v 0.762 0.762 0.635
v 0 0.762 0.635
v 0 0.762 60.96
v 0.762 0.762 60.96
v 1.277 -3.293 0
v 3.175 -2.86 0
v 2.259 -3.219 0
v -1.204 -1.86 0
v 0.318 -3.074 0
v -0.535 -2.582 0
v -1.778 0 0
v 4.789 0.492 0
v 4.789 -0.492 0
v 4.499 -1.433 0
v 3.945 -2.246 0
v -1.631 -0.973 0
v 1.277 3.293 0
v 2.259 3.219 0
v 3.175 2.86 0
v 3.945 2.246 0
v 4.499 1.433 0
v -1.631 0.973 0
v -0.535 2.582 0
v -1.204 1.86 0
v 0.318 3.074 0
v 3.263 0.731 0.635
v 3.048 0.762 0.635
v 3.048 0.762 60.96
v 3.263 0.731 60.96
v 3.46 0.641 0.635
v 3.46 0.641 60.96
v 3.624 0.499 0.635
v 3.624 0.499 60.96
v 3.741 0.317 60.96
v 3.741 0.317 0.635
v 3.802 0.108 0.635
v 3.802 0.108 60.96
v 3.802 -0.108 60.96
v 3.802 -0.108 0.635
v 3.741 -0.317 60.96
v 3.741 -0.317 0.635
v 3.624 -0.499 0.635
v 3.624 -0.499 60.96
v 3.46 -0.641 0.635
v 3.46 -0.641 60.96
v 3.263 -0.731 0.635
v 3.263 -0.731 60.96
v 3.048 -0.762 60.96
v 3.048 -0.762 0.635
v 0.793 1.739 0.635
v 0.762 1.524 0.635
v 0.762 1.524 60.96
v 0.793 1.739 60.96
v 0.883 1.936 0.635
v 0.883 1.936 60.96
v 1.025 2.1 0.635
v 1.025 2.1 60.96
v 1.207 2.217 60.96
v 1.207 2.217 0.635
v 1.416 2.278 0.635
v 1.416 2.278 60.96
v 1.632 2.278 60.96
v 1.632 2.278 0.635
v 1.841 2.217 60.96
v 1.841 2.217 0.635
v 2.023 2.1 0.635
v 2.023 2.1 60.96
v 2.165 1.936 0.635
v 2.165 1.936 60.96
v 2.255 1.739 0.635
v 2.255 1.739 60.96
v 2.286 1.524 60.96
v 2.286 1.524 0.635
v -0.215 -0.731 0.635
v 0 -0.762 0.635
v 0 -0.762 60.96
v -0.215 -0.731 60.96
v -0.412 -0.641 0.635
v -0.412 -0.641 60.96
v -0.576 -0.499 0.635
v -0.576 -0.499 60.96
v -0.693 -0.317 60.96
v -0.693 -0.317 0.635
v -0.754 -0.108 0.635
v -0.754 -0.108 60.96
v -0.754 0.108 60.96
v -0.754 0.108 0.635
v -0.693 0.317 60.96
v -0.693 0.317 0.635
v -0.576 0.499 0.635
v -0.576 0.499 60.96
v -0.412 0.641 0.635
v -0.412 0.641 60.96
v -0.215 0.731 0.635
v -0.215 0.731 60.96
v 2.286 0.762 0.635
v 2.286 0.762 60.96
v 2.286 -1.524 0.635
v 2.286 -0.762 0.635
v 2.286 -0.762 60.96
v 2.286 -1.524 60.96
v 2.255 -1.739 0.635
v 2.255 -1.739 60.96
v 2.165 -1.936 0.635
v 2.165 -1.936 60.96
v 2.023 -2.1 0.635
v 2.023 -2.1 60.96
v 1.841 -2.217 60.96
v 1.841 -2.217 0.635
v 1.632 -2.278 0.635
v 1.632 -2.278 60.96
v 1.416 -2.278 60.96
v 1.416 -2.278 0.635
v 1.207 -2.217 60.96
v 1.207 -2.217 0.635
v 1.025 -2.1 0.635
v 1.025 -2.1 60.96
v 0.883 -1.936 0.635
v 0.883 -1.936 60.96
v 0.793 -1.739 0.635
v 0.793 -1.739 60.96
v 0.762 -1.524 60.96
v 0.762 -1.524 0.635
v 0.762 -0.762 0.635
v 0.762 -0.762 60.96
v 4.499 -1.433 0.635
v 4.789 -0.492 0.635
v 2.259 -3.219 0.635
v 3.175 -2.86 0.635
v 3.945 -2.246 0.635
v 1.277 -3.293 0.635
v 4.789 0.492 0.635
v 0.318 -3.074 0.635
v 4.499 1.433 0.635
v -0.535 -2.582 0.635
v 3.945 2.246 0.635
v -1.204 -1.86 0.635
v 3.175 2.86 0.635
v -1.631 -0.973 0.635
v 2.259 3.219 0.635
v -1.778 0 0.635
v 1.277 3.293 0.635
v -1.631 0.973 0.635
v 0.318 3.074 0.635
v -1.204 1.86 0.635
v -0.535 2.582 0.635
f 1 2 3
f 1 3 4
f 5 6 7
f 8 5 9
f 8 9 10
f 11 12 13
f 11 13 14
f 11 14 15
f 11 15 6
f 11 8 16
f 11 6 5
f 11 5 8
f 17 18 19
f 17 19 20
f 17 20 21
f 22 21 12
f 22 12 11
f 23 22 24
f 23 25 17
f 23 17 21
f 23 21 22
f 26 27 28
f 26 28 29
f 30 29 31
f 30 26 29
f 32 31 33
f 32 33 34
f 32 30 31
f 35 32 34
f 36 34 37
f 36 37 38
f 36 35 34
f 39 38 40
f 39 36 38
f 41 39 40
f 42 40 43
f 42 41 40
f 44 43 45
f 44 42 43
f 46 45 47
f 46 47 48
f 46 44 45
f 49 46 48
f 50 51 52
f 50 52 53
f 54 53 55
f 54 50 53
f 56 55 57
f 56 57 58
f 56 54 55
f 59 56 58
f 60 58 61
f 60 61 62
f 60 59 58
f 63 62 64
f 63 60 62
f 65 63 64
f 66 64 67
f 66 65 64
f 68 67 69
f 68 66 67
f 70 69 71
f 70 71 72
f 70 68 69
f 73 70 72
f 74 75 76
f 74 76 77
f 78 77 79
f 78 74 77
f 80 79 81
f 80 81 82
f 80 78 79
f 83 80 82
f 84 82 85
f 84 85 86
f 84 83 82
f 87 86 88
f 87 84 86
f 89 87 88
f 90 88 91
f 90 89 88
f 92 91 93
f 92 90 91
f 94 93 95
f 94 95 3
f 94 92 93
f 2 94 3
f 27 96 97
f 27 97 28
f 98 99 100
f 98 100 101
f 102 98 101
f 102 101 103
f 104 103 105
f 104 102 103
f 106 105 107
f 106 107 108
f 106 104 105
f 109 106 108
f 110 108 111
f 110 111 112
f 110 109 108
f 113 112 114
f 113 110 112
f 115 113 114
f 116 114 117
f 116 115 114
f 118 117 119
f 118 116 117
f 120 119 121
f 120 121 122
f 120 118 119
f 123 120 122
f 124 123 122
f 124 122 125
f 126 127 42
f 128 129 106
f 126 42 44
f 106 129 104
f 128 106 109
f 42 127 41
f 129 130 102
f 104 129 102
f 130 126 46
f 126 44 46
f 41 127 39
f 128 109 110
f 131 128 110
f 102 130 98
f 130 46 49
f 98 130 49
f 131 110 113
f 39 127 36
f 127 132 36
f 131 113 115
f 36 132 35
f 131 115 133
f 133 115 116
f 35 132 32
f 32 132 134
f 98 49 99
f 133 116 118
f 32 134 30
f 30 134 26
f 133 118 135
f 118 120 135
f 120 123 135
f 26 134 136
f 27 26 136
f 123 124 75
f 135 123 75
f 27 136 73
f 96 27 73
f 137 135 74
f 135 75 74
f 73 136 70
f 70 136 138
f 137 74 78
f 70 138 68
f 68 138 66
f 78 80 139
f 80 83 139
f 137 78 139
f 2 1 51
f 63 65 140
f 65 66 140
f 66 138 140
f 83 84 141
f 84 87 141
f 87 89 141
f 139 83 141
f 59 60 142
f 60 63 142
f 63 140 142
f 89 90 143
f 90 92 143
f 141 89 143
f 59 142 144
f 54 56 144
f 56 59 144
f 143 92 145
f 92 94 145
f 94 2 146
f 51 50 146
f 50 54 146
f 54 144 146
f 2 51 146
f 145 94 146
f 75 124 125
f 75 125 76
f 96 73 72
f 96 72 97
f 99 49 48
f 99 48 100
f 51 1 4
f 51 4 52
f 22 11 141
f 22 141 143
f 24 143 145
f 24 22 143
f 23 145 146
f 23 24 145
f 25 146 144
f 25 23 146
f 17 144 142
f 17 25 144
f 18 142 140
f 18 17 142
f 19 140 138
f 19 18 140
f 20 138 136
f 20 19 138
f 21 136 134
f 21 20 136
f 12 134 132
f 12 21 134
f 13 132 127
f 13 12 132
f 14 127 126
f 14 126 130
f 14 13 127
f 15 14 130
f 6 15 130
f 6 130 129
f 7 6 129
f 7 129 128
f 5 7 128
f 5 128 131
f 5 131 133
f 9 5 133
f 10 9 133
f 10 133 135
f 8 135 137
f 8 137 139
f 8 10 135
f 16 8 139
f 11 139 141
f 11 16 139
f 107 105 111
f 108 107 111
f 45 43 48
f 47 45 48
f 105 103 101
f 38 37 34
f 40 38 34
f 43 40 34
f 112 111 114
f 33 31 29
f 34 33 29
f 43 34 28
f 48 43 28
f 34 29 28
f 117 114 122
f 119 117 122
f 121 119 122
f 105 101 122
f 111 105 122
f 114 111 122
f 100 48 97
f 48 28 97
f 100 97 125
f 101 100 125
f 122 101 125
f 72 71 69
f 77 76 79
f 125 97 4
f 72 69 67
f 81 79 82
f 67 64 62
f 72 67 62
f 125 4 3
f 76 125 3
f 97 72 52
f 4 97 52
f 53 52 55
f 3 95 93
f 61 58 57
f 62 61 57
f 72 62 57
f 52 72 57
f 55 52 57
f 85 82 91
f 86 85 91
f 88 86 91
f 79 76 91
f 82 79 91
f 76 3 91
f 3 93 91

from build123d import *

# Parameters (mm, degrees)
BOSS_EXTRUDE1_DEPTH = 60.96
SKETCH2_R           = 3.302
BOSS_EXTRUDE2_DEPTH = 0.635


with BuildPart() as part:
    # Sketch1 → Boss-Extrude1 (new body)
    with BuildSketch(Plane.XY):
        with BuildLine():
            Line((0.762, 0.762), (0, 0.762))
            ThreePointArc((0, 0.762), (-0.762, 0), (0, -0.762))
            Line((0, -0.762), (0.762, -0.762))
            Line((0.762, -0.762), (0.762, -1.524))
            ThreePointArc((0.762, -1.524), (1.524, -2.286), (2.286, -1.524))
            Line((2.286, -1.524), (2.286, -0.762))
            Line((2.286, -0.762), (3.048, -0.762))
            ThreePointArc((3.048, -0.762), (3.81, 0), (3.048, 0.762))
            Line((3.048, 0.762), (2.286, 0.762))
            Line((2.286, 0.762), (2.286, 1.524))
            ThreePointArc((2.286, 1.524), (1.524, 2.286), (0.762, 1.524))
            Line((0.762, 1.524), (0.762, 0.762))
        make_face()
    extrude(amount=BOSS_EXTRUDE1_DEPTH)

    # Sketch2 → Boss-Extrude2 (add)
    with BuildSketch(Plane(origin=(0, 0, 0), x_dir=(-1, 0, 0), z_dir=(0, 0, -1))):
        with Locations((-1.524, 0)):
            Circle(SKETCH2_R)
    extrude(amount=-BOSS_EXTRUDE2_DEPTH)


solid = part.part
